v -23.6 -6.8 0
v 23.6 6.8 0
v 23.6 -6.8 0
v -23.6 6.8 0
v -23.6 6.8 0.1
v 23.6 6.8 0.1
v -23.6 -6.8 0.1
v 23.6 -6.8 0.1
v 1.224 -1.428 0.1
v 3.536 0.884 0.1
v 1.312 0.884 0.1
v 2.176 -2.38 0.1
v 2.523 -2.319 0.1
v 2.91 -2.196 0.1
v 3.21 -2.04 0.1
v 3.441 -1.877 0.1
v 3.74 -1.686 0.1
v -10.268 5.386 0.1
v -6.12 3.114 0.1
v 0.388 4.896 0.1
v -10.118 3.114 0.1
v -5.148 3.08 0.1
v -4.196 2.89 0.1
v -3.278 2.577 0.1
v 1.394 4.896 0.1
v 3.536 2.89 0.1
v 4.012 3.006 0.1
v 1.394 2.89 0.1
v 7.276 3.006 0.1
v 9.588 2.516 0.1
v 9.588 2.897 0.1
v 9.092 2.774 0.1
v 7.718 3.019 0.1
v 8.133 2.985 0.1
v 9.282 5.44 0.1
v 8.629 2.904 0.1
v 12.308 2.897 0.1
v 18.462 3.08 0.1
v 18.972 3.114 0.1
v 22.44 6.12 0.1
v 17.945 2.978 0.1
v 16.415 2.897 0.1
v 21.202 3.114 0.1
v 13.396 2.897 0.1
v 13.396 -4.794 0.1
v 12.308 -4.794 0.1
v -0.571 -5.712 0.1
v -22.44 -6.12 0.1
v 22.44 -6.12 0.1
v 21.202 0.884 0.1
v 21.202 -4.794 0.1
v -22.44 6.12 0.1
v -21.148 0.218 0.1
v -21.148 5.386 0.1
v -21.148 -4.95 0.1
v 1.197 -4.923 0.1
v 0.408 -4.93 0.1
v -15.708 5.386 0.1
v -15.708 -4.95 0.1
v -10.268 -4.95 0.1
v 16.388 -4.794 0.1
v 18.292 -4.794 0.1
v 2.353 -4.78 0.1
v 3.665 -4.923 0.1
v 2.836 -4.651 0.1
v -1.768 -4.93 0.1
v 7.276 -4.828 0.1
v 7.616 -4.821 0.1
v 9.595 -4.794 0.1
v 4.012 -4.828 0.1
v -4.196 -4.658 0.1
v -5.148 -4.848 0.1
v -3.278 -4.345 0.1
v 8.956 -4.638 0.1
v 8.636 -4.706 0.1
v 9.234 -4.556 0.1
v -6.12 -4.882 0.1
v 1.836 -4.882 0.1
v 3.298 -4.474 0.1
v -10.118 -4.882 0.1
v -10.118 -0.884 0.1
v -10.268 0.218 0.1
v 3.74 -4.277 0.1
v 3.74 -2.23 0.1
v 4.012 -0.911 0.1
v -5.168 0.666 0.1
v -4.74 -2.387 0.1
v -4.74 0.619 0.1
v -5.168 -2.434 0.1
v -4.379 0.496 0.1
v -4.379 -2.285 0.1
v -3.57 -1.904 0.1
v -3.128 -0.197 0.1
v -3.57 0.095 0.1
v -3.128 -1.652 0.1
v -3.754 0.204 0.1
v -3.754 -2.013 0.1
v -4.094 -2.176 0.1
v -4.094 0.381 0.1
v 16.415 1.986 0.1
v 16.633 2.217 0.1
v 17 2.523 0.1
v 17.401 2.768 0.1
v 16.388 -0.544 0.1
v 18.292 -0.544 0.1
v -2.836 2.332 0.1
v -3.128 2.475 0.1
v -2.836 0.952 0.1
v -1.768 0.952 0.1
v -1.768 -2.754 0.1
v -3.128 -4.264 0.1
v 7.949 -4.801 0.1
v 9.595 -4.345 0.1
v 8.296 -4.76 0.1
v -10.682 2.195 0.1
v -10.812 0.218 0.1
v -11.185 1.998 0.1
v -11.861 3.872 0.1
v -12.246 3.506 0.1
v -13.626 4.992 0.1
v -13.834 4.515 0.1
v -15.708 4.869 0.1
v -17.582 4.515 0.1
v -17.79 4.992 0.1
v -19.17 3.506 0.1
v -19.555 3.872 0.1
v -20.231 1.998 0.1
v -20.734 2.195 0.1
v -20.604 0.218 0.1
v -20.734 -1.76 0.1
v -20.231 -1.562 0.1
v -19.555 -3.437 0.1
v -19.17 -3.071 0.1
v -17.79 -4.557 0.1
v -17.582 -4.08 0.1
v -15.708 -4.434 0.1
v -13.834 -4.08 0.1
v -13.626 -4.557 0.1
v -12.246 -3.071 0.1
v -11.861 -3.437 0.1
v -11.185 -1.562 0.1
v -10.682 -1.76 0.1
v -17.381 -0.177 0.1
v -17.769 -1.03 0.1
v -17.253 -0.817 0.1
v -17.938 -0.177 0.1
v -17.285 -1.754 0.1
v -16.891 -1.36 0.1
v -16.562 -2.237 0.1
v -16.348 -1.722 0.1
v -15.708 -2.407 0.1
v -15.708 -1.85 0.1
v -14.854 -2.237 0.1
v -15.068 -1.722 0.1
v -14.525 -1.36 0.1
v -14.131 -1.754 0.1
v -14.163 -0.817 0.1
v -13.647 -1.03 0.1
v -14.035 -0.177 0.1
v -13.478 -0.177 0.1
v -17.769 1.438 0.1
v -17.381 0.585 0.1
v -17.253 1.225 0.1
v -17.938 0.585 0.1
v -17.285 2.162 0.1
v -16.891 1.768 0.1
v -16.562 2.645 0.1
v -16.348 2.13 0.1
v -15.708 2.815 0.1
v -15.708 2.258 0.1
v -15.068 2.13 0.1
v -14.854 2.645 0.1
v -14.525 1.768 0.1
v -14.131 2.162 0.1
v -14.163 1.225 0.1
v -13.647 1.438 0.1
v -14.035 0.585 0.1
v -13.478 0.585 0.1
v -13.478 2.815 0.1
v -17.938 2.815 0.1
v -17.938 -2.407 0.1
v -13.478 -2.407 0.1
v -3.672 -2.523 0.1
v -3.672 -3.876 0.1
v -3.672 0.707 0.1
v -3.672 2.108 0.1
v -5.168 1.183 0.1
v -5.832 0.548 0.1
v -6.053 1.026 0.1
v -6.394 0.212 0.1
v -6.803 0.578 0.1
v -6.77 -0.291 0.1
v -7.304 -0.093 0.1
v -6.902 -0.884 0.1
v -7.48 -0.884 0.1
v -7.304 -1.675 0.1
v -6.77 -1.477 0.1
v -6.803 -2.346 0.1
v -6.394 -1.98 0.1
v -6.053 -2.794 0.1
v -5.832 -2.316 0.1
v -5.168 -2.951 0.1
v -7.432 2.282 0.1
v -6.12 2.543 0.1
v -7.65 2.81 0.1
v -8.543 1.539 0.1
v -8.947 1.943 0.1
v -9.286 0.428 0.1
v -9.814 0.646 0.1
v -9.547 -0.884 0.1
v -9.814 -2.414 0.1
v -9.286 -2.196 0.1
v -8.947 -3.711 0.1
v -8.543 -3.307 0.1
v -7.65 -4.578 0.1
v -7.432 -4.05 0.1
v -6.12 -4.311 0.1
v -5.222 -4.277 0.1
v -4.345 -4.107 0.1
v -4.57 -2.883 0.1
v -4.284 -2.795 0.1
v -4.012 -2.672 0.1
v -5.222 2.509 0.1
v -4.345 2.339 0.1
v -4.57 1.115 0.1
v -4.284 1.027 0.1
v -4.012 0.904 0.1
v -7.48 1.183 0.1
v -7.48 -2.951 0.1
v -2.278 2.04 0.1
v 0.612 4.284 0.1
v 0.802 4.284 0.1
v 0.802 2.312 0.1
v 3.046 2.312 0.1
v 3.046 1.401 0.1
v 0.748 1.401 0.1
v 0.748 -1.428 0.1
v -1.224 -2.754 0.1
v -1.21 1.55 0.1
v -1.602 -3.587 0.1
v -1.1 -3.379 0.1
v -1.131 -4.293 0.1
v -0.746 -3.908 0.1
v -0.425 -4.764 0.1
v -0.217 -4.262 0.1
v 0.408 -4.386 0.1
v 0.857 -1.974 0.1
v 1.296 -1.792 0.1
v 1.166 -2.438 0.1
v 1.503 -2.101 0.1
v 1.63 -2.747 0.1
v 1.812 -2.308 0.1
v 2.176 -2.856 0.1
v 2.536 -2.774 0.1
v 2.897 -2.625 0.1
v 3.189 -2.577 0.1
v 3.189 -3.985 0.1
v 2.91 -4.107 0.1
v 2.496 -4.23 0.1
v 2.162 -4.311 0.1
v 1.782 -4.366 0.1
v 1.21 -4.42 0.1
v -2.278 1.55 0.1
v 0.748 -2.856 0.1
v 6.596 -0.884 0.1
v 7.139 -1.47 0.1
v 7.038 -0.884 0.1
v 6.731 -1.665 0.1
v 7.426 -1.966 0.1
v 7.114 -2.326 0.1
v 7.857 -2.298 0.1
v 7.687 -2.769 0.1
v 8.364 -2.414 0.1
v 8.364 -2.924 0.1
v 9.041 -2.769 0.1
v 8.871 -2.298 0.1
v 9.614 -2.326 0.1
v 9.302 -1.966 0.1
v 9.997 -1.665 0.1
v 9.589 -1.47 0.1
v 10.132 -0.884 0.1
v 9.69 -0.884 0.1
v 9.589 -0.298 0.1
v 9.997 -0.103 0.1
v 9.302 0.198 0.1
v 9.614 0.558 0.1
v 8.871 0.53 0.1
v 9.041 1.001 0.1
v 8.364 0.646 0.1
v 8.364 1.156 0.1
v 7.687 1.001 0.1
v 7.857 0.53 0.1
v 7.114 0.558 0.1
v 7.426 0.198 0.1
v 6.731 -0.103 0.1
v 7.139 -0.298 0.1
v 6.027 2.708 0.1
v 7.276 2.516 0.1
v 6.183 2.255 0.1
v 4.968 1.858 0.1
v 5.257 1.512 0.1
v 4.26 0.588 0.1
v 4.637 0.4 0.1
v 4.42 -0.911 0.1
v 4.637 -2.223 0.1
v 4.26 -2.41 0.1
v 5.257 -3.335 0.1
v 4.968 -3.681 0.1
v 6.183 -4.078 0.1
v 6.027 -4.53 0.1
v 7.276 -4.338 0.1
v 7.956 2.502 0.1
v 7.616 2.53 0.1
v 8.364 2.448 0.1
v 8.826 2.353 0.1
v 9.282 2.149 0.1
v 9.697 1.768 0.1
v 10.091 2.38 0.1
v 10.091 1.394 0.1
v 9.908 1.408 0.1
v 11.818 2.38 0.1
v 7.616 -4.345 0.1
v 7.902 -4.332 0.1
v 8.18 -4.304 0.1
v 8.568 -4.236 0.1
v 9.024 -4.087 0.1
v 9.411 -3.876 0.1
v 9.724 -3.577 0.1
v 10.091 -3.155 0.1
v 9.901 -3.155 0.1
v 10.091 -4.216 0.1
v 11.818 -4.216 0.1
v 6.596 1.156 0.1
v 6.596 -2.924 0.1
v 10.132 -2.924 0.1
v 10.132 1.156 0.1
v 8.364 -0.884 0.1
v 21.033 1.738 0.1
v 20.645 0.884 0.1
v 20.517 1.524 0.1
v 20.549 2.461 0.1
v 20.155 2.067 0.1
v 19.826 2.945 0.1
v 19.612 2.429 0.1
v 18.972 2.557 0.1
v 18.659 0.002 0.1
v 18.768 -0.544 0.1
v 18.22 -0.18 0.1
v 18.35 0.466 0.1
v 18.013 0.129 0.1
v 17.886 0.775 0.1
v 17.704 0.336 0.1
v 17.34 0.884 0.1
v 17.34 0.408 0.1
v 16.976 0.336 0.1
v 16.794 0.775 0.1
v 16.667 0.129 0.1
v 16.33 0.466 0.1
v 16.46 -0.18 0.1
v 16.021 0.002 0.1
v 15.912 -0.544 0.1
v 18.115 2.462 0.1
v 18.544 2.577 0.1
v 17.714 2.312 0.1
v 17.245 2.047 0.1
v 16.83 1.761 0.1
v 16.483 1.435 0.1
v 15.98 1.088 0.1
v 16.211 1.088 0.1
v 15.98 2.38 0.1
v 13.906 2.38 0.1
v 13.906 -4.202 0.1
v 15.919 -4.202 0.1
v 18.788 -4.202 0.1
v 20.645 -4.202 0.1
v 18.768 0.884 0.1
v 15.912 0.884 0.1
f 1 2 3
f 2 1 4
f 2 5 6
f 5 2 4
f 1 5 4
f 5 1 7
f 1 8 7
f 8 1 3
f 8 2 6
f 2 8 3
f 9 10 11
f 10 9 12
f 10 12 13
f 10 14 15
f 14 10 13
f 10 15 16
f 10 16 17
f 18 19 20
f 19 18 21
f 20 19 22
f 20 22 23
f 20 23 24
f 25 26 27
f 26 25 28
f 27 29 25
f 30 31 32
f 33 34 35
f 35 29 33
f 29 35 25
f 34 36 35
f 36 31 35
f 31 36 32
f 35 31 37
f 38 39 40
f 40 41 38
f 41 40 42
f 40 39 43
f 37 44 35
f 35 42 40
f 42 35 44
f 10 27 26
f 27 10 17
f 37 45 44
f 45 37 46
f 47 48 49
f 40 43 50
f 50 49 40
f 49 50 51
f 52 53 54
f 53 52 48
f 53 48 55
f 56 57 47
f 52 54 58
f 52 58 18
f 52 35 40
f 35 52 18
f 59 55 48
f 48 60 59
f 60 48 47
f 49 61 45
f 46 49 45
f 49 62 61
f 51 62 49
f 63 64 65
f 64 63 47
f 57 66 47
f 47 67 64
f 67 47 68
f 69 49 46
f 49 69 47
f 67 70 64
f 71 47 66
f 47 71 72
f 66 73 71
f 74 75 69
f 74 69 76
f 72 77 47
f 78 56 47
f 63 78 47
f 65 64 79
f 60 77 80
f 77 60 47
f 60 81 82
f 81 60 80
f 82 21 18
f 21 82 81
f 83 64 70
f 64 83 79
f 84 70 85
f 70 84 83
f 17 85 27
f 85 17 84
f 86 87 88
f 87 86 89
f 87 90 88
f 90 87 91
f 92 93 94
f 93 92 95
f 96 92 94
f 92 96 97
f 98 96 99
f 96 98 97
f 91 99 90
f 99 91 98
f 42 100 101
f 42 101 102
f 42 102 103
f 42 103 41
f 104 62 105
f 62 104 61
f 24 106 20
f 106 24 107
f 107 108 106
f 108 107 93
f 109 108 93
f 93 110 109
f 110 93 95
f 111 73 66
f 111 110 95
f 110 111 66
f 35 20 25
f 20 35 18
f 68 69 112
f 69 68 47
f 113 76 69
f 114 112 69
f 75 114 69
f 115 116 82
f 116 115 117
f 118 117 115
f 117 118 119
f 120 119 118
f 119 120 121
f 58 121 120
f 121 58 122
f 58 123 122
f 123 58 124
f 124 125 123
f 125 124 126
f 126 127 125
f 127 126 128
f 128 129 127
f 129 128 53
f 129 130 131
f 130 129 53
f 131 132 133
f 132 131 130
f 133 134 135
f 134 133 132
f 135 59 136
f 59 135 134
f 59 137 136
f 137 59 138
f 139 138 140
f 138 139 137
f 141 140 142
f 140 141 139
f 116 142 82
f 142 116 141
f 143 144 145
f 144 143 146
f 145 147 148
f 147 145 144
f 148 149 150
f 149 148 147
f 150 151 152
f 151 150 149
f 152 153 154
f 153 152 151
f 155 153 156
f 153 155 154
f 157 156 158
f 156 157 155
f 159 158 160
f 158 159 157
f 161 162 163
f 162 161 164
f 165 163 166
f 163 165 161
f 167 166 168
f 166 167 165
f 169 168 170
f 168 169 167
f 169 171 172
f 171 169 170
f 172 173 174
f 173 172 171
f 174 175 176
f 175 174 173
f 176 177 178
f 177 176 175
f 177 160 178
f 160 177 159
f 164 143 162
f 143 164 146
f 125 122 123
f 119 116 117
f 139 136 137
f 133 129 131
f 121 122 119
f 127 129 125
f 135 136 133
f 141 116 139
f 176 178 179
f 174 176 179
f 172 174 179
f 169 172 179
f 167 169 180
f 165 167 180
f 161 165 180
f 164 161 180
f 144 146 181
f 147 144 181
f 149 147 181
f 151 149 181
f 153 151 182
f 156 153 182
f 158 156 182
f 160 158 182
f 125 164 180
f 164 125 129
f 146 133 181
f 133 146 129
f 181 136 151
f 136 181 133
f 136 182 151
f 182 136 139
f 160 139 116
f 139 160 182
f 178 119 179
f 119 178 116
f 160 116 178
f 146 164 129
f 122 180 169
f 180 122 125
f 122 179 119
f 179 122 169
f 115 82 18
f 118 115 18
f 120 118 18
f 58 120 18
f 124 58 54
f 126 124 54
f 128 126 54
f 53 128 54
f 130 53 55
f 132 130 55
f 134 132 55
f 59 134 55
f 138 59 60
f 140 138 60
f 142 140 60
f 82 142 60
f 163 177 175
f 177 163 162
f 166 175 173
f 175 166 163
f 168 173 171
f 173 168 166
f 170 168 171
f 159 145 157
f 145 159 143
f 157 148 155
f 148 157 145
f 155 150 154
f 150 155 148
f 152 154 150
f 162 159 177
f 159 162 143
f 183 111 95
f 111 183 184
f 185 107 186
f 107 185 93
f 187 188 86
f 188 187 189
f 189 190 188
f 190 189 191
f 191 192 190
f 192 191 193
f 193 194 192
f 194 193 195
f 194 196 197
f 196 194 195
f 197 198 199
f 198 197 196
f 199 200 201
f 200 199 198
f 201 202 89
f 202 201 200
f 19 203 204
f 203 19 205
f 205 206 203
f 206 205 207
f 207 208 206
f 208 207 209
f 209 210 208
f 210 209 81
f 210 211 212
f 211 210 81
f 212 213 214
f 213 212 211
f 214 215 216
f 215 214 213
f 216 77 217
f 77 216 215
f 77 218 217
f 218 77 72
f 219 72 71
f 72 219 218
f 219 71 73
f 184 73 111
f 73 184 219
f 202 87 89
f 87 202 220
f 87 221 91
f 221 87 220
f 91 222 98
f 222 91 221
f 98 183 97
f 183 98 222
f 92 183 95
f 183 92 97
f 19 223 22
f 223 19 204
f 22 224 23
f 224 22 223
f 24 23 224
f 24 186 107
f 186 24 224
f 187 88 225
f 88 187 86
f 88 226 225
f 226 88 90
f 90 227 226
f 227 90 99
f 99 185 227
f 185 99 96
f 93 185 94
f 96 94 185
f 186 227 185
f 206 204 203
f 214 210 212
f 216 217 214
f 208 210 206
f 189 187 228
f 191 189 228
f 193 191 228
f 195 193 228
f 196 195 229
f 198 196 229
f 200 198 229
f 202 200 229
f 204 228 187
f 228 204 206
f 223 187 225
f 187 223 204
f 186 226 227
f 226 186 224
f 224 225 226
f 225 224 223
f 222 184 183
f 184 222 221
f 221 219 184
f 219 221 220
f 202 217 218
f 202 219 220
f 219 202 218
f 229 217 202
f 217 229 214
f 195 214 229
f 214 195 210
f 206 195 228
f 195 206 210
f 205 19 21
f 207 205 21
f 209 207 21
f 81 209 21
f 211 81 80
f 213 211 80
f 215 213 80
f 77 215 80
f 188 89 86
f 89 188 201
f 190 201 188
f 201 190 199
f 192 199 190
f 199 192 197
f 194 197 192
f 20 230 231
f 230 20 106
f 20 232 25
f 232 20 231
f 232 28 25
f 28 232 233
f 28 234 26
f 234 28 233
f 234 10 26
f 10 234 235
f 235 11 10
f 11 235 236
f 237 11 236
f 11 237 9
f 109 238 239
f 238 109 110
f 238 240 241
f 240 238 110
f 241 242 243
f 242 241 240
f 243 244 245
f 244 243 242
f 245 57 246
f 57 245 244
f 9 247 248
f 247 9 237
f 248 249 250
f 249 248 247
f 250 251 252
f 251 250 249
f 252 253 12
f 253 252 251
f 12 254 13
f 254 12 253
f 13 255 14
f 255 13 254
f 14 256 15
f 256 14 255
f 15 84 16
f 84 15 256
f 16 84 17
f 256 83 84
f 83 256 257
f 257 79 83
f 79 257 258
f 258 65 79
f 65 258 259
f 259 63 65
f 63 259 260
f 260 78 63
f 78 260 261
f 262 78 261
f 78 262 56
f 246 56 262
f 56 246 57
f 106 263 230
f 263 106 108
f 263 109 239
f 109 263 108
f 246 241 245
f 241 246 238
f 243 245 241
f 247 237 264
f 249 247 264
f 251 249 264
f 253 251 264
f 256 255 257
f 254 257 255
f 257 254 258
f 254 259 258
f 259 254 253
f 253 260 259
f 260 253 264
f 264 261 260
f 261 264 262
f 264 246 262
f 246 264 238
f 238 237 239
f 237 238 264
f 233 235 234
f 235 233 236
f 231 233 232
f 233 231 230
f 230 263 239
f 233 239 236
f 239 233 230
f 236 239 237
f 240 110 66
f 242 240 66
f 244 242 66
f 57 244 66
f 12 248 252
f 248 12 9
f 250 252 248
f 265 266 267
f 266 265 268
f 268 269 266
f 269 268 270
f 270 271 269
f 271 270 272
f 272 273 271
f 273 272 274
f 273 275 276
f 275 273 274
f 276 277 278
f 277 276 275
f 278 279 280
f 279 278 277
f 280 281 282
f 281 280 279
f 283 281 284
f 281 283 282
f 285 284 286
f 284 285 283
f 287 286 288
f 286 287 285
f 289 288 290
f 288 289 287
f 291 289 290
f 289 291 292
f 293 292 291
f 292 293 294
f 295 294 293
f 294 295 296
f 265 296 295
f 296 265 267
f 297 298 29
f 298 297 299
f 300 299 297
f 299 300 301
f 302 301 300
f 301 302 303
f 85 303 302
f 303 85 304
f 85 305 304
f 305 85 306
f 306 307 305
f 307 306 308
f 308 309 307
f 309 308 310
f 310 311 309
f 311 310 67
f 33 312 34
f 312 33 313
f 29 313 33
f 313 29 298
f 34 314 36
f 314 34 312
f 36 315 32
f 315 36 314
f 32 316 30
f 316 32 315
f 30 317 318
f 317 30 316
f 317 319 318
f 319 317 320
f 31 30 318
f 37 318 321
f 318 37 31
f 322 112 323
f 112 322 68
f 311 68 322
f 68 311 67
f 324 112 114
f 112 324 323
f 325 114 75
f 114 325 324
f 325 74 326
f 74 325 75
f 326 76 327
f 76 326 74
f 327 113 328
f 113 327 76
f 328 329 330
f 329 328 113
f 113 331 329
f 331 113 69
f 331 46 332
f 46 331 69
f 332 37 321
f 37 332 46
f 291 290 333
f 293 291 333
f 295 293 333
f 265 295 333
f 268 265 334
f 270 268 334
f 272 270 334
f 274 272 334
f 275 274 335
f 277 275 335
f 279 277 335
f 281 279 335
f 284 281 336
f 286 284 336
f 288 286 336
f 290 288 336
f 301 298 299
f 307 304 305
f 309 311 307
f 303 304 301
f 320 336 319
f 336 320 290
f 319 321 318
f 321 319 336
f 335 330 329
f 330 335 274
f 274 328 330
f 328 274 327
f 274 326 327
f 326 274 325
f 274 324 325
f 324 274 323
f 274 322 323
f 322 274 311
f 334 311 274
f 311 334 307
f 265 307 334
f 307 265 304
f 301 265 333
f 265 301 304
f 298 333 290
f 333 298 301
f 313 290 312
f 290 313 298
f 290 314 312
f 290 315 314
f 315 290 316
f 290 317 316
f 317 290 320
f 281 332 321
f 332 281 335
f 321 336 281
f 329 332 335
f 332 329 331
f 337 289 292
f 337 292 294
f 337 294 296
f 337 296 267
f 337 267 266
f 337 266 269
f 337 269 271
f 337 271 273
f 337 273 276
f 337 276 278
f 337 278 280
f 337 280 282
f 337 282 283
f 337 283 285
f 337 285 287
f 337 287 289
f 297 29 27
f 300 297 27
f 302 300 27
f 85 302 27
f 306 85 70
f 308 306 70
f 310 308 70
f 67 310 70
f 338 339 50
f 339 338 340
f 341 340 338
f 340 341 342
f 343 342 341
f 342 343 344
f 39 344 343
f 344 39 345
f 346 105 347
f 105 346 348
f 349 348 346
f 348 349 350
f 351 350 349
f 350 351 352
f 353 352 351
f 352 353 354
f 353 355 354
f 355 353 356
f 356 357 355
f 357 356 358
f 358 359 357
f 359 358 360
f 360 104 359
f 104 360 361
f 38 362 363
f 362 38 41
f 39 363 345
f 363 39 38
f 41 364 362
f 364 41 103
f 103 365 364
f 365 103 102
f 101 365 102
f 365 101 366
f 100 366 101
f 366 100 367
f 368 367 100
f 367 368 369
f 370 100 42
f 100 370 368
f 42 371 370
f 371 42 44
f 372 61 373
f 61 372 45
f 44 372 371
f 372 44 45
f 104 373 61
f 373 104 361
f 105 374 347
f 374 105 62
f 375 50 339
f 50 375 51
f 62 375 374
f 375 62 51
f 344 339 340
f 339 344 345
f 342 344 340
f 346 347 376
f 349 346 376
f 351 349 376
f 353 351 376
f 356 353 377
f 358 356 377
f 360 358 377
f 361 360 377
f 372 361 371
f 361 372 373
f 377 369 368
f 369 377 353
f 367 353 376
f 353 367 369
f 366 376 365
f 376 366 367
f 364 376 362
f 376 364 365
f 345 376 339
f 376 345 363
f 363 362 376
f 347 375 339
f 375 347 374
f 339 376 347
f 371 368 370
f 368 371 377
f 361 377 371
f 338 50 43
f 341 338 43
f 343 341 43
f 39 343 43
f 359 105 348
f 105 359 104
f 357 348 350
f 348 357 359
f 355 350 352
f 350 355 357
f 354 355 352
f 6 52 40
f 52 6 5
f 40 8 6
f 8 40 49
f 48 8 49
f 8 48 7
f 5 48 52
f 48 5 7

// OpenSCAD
use <../lib.scad>
use <../p/box5-12.scad>
use <../p/logo-octantext.scad>
function ldraw_lib__165355a() = [
// 0 Sticker  1.7 x  5.9 with "Octan" on Transparent Background
// 0 Name: 165355a.dat
// 0 Author: Takeshi Takahashi [RainbowDolphin]
// 0 !LDRAW_ORG Part UPDATE 2023-04
// 0 !LICENSE Licensed under CC BY 4.0 : see CAreadme.txt
// 
// 0 BFC CERTIFY CCW
  [0,"BFC","CERTIFY"],
  [0,"BFC","CCW"],
// 
// 0 !KEYWORDS Bricklink 6594stk01, Brickowl 253587, Rebrickable 165355, Set 6594
// 0 !KEYWORDS tanker, Trailer, truck
// 
// 0 !HISTORY 2023-08-25 [OrionP] Official Update 2023-04
// 
// 
// 1 16 0 -0.25 0 59 0 0 0 0.25 0 0 0 17 box5-12.dat
  [1,16,0,-0.25,0,59,0,0,0,0.25,0,0,0,17, ldraw_lib__box5_12()],
// 0 BFC NOCLIP
  [0,"BFC","NOCLIP"],
// 1 16 0 -0.25 0 1.7 0 0 0 1 0 0 0 1.7 logo-octantext.dat
  [1,16,0,-0.25,0,1.7,0,0,0,1,0,0,0,1.7, ldraw_lib__logo_octantext()],
// 0 BFC CLIP
  [0,"BFC","CLIP"],
// 4 16 56.1 -0.25 15.3 59 -0.25 17 -59 -0.25 17 -56.1 -0.25 15.3
  [4,16,56.1,-0.25,15.3,59,-0.25,17,-59,-0.25,17,-56.1,-0.25,15.3],
// 4 16 59 -0.25 17 56.1 -0.25 15.3 56.1 -0.25 -15.3 59 -0.25 -17
  [4,16,59,-0.25,17,56.1,-0.25,15.3,56.1,-0.25,-15.3,59,-0.25,-17],
// 4 16 59 -0.25 -17 56.1 -0.25 -15.3 -56.1 -0.25 -15.3 -59 -0.25 -17
  [4,16,59,-0.25,-17,56.1,-0.25,-15.3,-56.1,-0.25,-15.3,-59,-0.25,-17],
// 4 16 -59 -0.25 -17 -56.1 -0.25 -15.3 -56.1 -0.25 15.3 -59 -0.25 17
  [4,16,-59,-0.25,-17,-56.1,-0.25,-15.3,-56.1,-0.25,15.3,-59,-0.25,17],
];
module ldraw_lib__165355a(step=0, col=false, unit=2/5, alt=false, line=0.2, solid=!$preview)
    makepoly(ldraw_lib__165355a(), step=step, col=col, unit=unit, alt=alt, line=line, solid=solid);
ldraw_lib__165355a(line=0.2);
